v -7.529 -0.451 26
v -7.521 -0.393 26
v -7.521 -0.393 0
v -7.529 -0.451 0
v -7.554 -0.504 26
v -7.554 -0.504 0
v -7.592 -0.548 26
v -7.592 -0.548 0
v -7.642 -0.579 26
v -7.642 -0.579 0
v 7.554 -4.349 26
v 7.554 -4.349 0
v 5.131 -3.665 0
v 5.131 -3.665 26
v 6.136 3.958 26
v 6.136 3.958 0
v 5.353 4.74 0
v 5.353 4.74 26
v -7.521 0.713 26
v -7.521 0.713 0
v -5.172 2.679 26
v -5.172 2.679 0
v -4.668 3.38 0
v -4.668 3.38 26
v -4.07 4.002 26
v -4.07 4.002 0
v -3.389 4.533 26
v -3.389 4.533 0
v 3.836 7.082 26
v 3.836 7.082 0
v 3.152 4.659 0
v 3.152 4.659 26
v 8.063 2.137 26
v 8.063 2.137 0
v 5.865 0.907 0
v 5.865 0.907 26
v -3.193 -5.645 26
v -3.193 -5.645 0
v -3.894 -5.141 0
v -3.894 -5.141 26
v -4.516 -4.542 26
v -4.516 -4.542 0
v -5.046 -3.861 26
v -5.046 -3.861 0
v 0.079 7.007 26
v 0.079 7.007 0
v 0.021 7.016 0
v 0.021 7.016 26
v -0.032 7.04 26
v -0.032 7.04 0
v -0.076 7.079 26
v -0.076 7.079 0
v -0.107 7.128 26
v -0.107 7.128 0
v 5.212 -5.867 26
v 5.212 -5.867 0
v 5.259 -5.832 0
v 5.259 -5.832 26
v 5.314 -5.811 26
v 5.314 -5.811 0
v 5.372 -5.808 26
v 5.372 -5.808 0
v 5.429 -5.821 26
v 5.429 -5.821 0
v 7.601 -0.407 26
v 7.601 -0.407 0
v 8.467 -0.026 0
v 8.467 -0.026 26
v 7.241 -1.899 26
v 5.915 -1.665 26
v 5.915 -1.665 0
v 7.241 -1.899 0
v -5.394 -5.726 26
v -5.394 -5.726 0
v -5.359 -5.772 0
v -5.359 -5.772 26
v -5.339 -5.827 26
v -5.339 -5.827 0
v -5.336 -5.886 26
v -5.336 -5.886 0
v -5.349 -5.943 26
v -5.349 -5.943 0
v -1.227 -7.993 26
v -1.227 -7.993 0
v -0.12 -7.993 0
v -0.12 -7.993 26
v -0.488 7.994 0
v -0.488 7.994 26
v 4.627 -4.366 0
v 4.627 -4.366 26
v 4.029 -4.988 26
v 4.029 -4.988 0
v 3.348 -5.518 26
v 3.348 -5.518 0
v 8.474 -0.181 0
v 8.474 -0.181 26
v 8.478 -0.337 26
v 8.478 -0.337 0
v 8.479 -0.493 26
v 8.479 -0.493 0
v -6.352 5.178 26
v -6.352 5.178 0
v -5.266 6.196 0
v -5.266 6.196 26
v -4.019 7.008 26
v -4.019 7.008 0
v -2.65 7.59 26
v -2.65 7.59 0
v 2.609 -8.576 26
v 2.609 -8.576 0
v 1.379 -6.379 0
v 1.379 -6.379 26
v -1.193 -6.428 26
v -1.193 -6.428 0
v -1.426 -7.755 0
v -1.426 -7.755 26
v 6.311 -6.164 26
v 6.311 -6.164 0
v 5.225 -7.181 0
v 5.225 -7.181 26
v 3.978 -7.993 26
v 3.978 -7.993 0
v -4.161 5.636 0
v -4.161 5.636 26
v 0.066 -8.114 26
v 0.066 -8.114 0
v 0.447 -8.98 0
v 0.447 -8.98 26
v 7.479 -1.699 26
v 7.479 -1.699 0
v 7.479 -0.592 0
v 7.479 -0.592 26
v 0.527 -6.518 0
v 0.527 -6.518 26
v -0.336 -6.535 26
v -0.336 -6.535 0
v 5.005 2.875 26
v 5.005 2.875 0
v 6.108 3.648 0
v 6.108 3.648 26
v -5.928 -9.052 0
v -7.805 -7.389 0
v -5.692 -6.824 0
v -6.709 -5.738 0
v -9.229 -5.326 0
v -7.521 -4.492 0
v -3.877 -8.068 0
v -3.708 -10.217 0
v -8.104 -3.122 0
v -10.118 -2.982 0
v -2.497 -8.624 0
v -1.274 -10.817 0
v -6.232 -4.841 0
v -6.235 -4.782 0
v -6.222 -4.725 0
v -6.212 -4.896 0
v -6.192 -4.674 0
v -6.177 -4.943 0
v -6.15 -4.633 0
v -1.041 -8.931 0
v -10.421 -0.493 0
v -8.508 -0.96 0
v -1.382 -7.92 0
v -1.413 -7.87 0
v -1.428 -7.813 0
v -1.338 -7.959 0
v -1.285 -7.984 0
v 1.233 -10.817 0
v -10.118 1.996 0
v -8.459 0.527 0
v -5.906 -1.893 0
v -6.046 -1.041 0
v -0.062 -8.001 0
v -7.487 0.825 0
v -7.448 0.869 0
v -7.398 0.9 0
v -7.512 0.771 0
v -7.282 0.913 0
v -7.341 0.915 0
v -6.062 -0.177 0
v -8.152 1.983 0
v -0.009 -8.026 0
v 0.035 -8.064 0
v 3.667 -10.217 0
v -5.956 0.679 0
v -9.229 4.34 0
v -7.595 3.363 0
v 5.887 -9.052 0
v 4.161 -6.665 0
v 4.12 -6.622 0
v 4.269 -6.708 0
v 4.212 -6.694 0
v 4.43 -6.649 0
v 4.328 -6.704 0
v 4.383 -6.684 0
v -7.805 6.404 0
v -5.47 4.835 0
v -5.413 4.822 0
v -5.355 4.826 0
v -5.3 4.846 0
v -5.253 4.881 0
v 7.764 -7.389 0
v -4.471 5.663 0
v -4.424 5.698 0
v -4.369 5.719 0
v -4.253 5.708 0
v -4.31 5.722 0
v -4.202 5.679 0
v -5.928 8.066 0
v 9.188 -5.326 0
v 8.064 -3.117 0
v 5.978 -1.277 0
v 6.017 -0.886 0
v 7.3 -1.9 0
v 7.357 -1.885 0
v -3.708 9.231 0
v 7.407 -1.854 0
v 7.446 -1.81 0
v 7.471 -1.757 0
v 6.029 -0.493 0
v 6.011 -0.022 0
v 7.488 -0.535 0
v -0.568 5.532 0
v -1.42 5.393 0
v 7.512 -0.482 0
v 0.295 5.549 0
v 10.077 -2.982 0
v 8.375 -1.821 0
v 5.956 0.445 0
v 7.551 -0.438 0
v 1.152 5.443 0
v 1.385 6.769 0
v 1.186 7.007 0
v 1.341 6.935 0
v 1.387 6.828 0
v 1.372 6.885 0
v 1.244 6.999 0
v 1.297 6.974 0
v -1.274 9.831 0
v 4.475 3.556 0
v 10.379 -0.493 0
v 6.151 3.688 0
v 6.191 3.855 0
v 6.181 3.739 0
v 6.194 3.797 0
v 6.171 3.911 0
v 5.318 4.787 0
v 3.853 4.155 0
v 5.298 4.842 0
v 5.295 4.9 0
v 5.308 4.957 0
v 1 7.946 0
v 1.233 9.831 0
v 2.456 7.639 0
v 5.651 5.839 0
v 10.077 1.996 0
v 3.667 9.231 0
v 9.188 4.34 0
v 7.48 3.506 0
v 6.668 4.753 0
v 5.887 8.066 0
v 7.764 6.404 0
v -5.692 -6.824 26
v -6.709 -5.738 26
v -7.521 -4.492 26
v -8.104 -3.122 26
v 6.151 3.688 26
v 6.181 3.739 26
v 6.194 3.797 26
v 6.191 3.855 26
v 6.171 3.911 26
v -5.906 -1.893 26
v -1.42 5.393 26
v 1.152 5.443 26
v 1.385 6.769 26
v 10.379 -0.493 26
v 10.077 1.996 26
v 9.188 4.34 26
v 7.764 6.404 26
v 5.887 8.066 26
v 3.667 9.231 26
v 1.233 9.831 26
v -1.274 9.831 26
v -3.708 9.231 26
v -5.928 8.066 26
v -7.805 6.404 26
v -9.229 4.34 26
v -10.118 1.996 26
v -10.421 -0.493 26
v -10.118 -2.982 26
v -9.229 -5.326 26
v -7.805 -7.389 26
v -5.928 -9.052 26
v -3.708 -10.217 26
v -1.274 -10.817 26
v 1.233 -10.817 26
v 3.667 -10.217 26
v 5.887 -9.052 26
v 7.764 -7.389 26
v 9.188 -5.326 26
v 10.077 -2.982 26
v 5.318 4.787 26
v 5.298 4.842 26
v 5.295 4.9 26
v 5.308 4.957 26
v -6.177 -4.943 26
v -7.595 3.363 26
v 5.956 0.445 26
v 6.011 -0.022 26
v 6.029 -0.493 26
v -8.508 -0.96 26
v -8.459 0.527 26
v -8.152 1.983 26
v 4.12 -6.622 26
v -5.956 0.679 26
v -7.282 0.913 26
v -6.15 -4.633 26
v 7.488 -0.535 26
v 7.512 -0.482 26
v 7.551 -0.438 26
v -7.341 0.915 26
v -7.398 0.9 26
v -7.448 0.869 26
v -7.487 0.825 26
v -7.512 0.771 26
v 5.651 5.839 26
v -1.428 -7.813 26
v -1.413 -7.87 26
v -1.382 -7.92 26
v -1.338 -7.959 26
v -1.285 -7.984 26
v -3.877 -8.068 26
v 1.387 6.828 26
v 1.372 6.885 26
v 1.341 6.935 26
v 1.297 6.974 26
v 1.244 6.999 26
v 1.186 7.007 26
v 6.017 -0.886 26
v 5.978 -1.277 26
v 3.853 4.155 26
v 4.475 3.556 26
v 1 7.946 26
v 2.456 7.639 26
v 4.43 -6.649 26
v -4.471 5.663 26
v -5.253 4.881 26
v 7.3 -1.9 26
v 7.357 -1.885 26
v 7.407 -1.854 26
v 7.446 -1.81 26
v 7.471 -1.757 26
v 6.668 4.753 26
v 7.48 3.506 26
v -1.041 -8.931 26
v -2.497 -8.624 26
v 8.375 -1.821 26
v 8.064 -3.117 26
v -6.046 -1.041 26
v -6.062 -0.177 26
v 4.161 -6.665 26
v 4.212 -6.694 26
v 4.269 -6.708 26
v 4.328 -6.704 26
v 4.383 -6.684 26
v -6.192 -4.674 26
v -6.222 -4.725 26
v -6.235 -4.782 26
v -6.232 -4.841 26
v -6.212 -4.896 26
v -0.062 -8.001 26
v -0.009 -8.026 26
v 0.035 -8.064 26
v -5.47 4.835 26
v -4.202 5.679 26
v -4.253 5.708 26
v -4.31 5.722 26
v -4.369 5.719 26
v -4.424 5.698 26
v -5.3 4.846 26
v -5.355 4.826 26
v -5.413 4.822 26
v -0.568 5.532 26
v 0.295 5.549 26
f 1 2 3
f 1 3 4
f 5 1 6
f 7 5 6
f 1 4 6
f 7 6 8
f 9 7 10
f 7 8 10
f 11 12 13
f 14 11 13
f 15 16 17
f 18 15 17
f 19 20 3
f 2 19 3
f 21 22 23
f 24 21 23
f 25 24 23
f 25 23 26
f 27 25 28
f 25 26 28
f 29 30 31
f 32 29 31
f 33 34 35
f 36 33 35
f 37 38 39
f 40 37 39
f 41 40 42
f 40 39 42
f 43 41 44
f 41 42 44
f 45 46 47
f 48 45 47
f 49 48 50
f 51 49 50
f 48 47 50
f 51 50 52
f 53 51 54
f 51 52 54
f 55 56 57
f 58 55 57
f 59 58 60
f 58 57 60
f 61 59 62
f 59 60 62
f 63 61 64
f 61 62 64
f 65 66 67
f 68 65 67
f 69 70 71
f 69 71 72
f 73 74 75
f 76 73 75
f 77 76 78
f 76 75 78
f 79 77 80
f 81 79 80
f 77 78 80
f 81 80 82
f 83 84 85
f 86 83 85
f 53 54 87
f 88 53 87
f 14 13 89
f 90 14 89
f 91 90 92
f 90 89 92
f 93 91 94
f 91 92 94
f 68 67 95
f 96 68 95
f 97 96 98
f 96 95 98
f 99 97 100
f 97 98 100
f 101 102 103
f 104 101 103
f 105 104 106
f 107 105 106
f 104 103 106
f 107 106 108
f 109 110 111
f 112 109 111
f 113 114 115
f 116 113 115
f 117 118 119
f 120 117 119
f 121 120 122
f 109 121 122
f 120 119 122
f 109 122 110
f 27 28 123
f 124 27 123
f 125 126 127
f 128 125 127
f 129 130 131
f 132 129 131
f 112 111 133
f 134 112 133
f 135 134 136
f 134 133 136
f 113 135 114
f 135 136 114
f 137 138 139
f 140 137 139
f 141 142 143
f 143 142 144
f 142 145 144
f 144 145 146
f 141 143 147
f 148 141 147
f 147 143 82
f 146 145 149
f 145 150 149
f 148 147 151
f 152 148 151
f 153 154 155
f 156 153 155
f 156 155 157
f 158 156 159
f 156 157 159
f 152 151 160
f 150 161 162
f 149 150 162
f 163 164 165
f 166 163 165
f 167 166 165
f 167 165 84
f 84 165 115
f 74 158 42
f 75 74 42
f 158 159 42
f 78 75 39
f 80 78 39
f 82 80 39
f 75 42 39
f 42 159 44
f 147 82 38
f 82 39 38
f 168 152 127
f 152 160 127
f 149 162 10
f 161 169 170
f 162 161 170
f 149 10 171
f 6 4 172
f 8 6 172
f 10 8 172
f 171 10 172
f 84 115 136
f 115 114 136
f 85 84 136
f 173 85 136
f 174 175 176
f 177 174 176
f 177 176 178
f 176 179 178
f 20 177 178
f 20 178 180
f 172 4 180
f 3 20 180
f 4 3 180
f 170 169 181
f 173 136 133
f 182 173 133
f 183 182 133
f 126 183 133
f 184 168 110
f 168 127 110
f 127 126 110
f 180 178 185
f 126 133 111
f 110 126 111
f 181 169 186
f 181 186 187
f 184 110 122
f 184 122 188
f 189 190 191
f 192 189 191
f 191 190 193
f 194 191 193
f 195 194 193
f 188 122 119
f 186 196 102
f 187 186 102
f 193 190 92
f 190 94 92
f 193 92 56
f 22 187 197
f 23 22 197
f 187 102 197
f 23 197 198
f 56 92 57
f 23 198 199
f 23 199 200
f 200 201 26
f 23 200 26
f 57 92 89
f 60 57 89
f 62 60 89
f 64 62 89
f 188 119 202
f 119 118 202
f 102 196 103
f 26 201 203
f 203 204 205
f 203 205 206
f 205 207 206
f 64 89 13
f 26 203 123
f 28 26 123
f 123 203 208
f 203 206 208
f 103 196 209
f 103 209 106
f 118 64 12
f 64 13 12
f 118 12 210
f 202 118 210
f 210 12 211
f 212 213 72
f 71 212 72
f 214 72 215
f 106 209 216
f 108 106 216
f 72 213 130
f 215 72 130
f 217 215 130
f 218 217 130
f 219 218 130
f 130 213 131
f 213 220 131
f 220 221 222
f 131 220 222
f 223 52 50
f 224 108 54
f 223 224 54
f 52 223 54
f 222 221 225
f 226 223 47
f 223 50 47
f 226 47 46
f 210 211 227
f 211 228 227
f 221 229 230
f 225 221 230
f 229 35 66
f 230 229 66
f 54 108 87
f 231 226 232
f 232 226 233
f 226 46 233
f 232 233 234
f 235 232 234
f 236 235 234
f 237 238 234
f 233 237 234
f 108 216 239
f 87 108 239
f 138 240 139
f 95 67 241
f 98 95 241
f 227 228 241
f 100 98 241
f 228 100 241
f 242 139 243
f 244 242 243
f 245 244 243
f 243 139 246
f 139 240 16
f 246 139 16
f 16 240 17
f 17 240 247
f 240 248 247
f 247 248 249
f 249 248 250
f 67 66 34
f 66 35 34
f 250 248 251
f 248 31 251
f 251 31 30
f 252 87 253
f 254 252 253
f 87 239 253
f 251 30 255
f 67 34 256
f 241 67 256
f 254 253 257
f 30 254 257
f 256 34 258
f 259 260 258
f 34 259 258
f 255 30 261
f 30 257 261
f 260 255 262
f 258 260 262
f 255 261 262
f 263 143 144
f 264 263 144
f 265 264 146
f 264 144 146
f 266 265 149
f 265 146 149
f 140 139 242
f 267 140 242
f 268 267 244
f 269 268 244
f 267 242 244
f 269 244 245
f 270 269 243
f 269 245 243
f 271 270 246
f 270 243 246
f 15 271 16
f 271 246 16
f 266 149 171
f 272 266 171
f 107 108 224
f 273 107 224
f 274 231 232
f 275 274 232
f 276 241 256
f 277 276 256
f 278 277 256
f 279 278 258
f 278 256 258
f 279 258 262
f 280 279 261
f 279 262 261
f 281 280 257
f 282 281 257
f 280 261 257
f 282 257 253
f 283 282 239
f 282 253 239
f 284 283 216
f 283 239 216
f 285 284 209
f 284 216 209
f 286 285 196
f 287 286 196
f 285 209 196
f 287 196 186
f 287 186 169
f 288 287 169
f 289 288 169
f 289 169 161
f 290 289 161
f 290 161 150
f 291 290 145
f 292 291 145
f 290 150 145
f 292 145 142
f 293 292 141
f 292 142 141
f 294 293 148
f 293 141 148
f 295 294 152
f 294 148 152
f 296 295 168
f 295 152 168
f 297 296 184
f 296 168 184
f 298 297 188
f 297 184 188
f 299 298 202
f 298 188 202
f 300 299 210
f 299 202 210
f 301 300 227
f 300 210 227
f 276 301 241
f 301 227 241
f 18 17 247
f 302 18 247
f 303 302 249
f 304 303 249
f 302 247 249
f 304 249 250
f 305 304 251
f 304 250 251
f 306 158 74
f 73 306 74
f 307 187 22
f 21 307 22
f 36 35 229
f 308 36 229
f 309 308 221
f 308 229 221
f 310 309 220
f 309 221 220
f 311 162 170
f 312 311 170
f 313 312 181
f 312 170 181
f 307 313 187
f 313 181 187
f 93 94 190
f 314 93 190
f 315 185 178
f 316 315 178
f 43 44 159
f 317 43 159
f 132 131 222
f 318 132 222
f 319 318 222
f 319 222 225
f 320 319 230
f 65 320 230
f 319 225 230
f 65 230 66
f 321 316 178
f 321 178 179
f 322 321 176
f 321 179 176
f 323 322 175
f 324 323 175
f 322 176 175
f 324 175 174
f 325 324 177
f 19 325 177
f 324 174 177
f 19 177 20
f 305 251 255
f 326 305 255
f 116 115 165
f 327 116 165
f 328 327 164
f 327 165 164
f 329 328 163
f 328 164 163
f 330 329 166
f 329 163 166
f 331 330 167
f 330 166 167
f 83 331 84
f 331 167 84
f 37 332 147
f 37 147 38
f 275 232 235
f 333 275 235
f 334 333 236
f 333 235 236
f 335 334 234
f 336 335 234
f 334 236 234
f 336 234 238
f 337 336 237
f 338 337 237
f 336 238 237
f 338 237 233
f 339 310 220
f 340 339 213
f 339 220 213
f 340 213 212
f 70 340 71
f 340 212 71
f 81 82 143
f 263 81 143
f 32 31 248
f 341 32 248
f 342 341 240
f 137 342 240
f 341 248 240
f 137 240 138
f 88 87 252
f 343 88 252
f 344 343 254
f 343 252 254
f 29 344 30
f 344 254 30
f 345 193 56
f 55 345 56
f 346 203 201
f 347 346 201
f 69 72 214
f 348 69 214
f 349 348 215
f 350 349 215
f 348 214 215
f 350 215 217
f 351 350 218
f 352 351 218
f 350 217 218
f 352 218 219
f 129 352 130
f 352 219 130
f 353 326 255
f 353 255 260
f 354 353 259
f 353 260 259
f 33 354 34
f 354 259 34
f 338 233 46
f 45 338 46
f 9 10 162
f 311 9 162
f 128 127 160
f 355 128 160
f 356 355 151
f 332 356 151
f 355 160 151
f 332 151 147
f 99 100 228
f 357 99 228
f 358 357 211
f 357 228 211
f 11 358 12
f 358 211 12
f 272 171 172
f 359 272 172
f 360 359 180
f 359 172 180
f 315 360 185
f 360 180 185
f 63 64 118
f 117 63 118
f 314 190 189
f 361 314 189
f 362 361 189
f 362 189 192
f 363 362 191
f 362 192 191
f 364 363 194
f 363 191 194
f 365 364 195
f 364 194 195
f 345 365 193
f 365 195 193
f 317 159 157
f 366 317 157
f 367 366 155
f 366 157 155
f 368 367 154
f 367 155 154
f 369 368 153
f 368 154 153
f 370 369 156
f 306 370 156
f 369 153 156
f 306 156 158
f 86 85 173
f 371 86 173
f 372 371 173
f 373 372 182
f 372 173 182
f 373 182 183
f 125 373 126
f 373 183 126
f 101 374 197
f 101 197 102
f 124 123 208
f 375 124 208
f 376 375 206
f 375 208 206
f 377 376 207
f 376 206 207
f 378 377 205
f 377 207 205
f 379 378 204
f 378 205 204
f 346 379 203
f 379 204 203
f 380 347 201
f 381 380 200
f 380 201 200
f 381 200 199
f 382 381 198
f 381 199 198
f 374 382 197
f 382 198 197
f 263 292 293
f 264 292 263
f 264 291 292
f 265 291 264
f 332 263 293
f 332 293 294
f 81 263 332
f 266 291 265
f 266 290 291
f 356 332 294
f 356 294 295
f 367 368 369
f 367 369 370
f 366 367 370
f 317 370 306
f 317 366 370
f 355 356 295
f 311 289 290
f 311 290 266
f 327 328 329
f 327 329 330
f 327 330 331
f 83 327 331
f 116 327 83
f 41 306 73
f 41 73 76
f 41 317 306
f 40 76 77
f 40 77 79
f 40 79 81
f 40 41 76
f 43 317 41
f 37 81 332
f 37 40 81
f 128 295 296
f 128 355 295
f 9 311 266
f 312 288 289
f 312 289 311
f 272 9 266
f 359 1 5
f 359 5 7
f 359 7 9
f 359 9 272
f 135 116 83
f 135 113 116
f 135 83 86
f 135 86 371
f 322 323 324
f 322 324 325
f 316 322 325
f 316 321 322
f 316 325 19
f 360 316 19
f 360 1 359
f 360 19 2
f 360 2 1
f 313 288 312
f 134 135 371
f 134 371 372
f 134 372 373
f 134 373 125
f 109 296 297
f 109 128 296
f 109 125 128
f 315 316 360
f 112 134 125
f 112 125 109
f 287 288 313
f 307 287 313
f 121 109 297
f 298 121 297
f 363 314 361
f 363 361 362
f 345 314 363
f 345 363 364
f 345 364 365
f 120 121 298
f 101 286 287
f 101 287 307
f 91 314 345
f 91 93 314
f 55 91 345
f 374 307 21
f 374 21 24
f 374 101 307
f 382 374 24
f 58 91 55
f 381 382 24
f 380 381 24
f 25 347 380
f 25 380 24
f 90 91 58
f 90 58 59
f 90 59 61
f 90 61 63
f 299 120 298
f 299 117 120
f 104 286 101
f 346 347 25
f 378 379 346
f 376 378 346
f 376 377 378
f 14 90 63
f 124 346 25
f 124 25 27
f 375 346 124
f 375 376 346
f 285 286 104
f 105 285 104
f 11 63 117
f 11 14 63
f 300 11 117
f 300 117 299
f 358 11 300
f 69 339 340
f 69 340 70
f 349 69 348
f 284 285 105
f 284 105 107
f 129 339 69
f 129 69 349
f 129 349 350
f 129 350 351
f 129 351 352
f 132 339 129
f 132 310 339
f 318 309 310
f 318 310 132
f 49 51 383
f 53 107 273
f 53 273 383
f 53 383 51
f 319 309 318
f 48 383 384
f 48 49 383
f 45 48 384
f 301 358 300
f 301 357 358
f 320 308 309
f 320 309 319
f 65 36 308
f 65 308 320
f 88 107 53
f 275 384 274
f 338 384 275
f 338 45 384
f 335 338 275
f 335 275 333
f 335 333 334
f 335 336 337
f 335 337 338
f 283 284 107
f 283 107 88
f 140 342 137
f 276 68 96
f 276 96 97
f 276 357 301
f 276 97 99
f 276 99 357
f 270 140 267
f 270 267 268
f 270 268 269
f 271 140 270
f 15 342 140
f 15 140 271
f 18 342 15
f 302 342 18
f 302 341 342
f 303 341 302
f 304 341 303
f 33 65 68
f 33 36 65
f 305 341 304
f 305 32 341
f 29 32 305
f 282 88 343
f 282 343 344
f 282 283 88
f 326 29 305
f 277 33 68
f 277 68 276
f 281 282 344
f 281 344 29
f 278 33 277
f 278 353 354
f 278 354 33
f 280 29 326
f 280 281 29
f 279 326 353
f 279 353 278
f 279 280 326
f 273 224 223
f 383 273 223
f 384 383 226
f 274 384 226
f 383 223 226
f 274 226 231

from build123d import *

# Parameters (mm, degrees)
F0_R     = 10.4
F1_DEPTH = 26


with BuildPart() as f1:
    # F0 (on Top) → F1 (new body)
    with BuildSketch(Plane.XY):
        with Locations((-0.02051, -0.492754)):
            Circle(F0_R)
        with BuildLine():
            ThreePointArc((5.65055, 5.838841), (7.10127, 4.147317), (8.062501, 2.136875))
            ThreePointArc((8.062501, 2.136875), (8.334835, 1.068726), (8.466648, -0.025685))
            ThreePointArc((8.466648, -0.025685), (8.476279, -0.259131), (8.47949, -0.492754))
            ThreePointArc((8.47949, -0.492754), (8.245001, -2.475514), (7.55447, -4.348877))
            ThreePointArc((7.55447, -4.348877), (6.991744, -5.296742), (6.311085, -6.163813))
            ThreePointArc((6.311085, -6.163813), (4.619561, -7.614533), (2.609119, -8.575764))
            ThreePointArc((2.609119, -8.575764), (1.540969, -8.848098), (0.446559, -8.979911))
            ThreePointArc((0.446559, -8.979911), (-1.775343, -8.809638), (-3.876633, -8.067733))
            ThreePointArc((-3.876633, -8.067733), (-4.824498, -7.505007), (-5.691569, -6.824348))
            ThreePointArc((-5.691569, -6.824348), (-7.142289, -5.132824), (-8.10352, -3.122382))
            ThreePointArc((-8.10352, -3.122382), (-8.375854, -2.054233), (-8.507667, -0.959822))
            ThreePointArc((-8.507667, -0.959822), (-8.337394, 1.26208), (-7.595489, 3.36337))
            ThreePointArc((-7.595489, 3.36337), (-7.032763, 4.311235), (-6.352104, 5.178306))
            ThreePointArc((-6.352104, 5.178306), (-4.66058, 6.629026), (-2.650138, 7.590257))
            ThreePointArc((-2.650138, 7.590257), (-1.581989, 7.862591), (-0.487578, 7.994404))
            ThreePointArc((-0.487578, 7.994404), (1.734324, 7.82413), (3.835614, 7.082226))
            ThreePointArc((3.835614, 7.082226), (4.783479, 6.5195), (5.65055, 5.838841))
        make_face(mode=Mode.SUBTRACT)
        with BuildLine():
            ThreePointArc((-5.906331, -1.892612), (-6.069387, -0.609324), (-5.955895, 0.679294))
            Line((-5.955895, 0.679294), (-7.282285, 0.913172))
            ThreePointArc((-7.282285, 0.913172), (-7.448003, 0.868768), (-7.52051, 0.713278))
            Line((-7.52051, 0.713278), (-7.52051, -0.393065))
            ThreePointArc((-7.52051, -0.393065), (-7.5535, -0.50399), (-7.641748, -0.578857))
            Line((-7.641748, -0.578857), (-8.507667, -0.959822))
            ThreePointArc((-8.507667, -0.959822), (-8.375854, -2.054233), (-8.10352, -3.122382))
            Line((-8.10352, -3.122382), (-5.906331, -1.892612))
        make_face()
        with BuildLine():
            ThreePointArc((-5.172264, 2.679301), (-4.380139, 3.702021), (-3.388698, 4.532961))
            Line((-3.388698, 4.532961), (-4.16122, 5.636236))
            ThreePointArc((-4.16122, 5.636236), (-4.309799, 5.722019), (-4.471018, 5.66334))
            Line((-4.471018, 5.66334), (-5.25332, 4.881038))
            ThreePointArc((-5.25332, 4.881038), (-5.355083, 4.82593), (-5.470423, 4.835391))
            Line((-5.470423, 4.835391), (-6.352104, 5.178306))
            ThreePointArc((-6.352104, 5.178306), (-7.032763, 4.311235), (-7.595489, 3.36337))
            Line((-7.595489, 3.36337), (-5.172264, 2.679301))
        make_face()
        with BuildLine():
            ThreePointArc((-1.420368, 5.393068), (-0.13708, 5.556123), (1.151538, 5.442632))
            Line((1.151538, 5.442632), (1.385416, 6.769021))
            ThreePointArc((1.385416, 6.769021), (1.341012, 6.93474), (1.185522, 7.007246))
            Line((1.185522, 7.007246), (0.079179, 7.007246))
            ThreePointArc((0.079179, 7.007246), (-0.031746, 7.040237), (-0.106613, 7.128485))
            Line((-0.106613, 7.128485), (-0.487578, 7.994404))
            ThreePointArc((-0.487578, 7.994404), (-1.581989, 7.862591), (-2.650138, 7.590257))
            Line((-2.650138, 7.590257), (-1.420368, 5.393068))
        make_face()
        with BuildLine():
            ThreePointArc((3.151545, 4.659), (4.174265, 3.866876), (5.005205, 2.875435))
            Line((5.005205, 2.875435), (6.10848, 3.647957))
            ThreePointArc((6.10848, 3.647957), (6.194263, 3.796536), (6.135584, 3.957754))
            Line((6.135584, 3.957754), (5.353282, 4.740057))
            ThreePointArc((5.353282, 4.740057), (5.298174, 4.84182), (5.307635, 4.95716))
            Line((5.307635, 4.95716), (5.65055, 5.838841))
            ThreePointArc((5.65055, 5.838841), (4.783479, 6.5195), (3.835614, 7.082226))
            Line((3.835614, 7.082226), (3.151545, 4.659))
        make_face()
        with BuildLine():
            ThreePointArc((5.865312, 0.907105), (5.988306, 0.211973), (6.02949, -0.492754))
            ThreePointArc((6.02949, -0.492754), (6.000769, -1.081573), (5.914876, -1.664801))
            Line((5.914876, -1.664801), (7.241265, -1.89868))
            ThreePointArc((7.241265, -1.89868), (7.406984, -1.854275), (7.47949, -1.698785))
            Line((7.47949, -1.698785), (7.47949, -0.592443))
            ThreePointArc((7.47949, -0.592443), (7.512481, -0.481518), (7.600728, -0.40665))
            Line((7.600728, -0.40665), (8.466648, -0.025685))
            ThreePointArc((8.466648, -0.025685), (8.334835, 1.068726), (8.062501, 2.136875))
            Line((8.062501, 2.136875), (5.865312, 0.907105))
        make_face()
        with BuildLine():
            Line((7.55447, -4.348877), (5.131244, -3.664808))
            ThreePointArc((5.131244, -3.664808), (4.33912, -4.687528), (3.347679, -5.518468))
            Line((3.347679, -5.518468), (4.120201, -6.621744))
            ThreePointArc((4.120201, -6.621744), (4.26878, -6.707526), (4.429998, -6.648847))
            Line((4.429998, -6.648847), (5.2123, -5.866545))
            ThreePointArc((5.2123, -5.866545), (5.314064, -5.811437), (5.429404, -5.820899))
            Line((5.429404, -5.820899), (6.311085, -6.163813))
            ThreePointArc((6.311085, -6.163813), (6.991744, -5.296742), (7.55447, -4.348877))
        make_face()
        with BuildLine():
            Line((2.609119, -8.575764), (1.379349, -6.378575))
            ThreePointArc((1.379349, -6.378575), (0.096061, -6.54163), (-1.192557, -6.428139))
            Line((-1.192557, -6.428139), (-1.426436, -7.754529))
            ThreePointArc((-1.426436, -7.754529), (-1.382031, -7.920247), (-1.226541, -7.992754))
            Line((-1.226541, -7.992754), (-0.120199, -7.992754))
            ThreePointArc((-0.120199, -7.992754), (-0.009274, -8.025744), (0.065594, -8.113992))
            Line((0.065594, -8.113992), (0.446559, -8.979911))
            ThreePointArc((0.446559, -8.979911), (1.540969, -8.848098), (2.609119, -8.575764))
        make_face()
        with BuildLine():
            Line((-3.876633, -8.067733), (-3.192564, -5.644508))
            ThreePointArc((-3.192564, -5.644508), (-4.215284, -4.852383), (-5.046224, -3.860942))
            Line((-5.046224, -3.860942), (-6.1495, -4.633464))
            ThreePointArc((-6.1495, -4.633464), (-6.235282, -4.782043), (-6.176604, -4.943262))
            Line((-6.176604, -4.943262), (-5.394301, -5.725564))
            ThreePointArc((-5.394301, -5.725564), (-5.339193, -5.827327), (-5.348655, -5.942667))
            Line((-5.348655, -5.942667), (-5.691569, -6.824348))
            ThreePointArc((-5.691569, -6.824348), (-4.824498, -7.505007), (-3.876633, -8.067733))
        make_face()
    extrude(amount=F1_DEPTH)


solid = f1.part
